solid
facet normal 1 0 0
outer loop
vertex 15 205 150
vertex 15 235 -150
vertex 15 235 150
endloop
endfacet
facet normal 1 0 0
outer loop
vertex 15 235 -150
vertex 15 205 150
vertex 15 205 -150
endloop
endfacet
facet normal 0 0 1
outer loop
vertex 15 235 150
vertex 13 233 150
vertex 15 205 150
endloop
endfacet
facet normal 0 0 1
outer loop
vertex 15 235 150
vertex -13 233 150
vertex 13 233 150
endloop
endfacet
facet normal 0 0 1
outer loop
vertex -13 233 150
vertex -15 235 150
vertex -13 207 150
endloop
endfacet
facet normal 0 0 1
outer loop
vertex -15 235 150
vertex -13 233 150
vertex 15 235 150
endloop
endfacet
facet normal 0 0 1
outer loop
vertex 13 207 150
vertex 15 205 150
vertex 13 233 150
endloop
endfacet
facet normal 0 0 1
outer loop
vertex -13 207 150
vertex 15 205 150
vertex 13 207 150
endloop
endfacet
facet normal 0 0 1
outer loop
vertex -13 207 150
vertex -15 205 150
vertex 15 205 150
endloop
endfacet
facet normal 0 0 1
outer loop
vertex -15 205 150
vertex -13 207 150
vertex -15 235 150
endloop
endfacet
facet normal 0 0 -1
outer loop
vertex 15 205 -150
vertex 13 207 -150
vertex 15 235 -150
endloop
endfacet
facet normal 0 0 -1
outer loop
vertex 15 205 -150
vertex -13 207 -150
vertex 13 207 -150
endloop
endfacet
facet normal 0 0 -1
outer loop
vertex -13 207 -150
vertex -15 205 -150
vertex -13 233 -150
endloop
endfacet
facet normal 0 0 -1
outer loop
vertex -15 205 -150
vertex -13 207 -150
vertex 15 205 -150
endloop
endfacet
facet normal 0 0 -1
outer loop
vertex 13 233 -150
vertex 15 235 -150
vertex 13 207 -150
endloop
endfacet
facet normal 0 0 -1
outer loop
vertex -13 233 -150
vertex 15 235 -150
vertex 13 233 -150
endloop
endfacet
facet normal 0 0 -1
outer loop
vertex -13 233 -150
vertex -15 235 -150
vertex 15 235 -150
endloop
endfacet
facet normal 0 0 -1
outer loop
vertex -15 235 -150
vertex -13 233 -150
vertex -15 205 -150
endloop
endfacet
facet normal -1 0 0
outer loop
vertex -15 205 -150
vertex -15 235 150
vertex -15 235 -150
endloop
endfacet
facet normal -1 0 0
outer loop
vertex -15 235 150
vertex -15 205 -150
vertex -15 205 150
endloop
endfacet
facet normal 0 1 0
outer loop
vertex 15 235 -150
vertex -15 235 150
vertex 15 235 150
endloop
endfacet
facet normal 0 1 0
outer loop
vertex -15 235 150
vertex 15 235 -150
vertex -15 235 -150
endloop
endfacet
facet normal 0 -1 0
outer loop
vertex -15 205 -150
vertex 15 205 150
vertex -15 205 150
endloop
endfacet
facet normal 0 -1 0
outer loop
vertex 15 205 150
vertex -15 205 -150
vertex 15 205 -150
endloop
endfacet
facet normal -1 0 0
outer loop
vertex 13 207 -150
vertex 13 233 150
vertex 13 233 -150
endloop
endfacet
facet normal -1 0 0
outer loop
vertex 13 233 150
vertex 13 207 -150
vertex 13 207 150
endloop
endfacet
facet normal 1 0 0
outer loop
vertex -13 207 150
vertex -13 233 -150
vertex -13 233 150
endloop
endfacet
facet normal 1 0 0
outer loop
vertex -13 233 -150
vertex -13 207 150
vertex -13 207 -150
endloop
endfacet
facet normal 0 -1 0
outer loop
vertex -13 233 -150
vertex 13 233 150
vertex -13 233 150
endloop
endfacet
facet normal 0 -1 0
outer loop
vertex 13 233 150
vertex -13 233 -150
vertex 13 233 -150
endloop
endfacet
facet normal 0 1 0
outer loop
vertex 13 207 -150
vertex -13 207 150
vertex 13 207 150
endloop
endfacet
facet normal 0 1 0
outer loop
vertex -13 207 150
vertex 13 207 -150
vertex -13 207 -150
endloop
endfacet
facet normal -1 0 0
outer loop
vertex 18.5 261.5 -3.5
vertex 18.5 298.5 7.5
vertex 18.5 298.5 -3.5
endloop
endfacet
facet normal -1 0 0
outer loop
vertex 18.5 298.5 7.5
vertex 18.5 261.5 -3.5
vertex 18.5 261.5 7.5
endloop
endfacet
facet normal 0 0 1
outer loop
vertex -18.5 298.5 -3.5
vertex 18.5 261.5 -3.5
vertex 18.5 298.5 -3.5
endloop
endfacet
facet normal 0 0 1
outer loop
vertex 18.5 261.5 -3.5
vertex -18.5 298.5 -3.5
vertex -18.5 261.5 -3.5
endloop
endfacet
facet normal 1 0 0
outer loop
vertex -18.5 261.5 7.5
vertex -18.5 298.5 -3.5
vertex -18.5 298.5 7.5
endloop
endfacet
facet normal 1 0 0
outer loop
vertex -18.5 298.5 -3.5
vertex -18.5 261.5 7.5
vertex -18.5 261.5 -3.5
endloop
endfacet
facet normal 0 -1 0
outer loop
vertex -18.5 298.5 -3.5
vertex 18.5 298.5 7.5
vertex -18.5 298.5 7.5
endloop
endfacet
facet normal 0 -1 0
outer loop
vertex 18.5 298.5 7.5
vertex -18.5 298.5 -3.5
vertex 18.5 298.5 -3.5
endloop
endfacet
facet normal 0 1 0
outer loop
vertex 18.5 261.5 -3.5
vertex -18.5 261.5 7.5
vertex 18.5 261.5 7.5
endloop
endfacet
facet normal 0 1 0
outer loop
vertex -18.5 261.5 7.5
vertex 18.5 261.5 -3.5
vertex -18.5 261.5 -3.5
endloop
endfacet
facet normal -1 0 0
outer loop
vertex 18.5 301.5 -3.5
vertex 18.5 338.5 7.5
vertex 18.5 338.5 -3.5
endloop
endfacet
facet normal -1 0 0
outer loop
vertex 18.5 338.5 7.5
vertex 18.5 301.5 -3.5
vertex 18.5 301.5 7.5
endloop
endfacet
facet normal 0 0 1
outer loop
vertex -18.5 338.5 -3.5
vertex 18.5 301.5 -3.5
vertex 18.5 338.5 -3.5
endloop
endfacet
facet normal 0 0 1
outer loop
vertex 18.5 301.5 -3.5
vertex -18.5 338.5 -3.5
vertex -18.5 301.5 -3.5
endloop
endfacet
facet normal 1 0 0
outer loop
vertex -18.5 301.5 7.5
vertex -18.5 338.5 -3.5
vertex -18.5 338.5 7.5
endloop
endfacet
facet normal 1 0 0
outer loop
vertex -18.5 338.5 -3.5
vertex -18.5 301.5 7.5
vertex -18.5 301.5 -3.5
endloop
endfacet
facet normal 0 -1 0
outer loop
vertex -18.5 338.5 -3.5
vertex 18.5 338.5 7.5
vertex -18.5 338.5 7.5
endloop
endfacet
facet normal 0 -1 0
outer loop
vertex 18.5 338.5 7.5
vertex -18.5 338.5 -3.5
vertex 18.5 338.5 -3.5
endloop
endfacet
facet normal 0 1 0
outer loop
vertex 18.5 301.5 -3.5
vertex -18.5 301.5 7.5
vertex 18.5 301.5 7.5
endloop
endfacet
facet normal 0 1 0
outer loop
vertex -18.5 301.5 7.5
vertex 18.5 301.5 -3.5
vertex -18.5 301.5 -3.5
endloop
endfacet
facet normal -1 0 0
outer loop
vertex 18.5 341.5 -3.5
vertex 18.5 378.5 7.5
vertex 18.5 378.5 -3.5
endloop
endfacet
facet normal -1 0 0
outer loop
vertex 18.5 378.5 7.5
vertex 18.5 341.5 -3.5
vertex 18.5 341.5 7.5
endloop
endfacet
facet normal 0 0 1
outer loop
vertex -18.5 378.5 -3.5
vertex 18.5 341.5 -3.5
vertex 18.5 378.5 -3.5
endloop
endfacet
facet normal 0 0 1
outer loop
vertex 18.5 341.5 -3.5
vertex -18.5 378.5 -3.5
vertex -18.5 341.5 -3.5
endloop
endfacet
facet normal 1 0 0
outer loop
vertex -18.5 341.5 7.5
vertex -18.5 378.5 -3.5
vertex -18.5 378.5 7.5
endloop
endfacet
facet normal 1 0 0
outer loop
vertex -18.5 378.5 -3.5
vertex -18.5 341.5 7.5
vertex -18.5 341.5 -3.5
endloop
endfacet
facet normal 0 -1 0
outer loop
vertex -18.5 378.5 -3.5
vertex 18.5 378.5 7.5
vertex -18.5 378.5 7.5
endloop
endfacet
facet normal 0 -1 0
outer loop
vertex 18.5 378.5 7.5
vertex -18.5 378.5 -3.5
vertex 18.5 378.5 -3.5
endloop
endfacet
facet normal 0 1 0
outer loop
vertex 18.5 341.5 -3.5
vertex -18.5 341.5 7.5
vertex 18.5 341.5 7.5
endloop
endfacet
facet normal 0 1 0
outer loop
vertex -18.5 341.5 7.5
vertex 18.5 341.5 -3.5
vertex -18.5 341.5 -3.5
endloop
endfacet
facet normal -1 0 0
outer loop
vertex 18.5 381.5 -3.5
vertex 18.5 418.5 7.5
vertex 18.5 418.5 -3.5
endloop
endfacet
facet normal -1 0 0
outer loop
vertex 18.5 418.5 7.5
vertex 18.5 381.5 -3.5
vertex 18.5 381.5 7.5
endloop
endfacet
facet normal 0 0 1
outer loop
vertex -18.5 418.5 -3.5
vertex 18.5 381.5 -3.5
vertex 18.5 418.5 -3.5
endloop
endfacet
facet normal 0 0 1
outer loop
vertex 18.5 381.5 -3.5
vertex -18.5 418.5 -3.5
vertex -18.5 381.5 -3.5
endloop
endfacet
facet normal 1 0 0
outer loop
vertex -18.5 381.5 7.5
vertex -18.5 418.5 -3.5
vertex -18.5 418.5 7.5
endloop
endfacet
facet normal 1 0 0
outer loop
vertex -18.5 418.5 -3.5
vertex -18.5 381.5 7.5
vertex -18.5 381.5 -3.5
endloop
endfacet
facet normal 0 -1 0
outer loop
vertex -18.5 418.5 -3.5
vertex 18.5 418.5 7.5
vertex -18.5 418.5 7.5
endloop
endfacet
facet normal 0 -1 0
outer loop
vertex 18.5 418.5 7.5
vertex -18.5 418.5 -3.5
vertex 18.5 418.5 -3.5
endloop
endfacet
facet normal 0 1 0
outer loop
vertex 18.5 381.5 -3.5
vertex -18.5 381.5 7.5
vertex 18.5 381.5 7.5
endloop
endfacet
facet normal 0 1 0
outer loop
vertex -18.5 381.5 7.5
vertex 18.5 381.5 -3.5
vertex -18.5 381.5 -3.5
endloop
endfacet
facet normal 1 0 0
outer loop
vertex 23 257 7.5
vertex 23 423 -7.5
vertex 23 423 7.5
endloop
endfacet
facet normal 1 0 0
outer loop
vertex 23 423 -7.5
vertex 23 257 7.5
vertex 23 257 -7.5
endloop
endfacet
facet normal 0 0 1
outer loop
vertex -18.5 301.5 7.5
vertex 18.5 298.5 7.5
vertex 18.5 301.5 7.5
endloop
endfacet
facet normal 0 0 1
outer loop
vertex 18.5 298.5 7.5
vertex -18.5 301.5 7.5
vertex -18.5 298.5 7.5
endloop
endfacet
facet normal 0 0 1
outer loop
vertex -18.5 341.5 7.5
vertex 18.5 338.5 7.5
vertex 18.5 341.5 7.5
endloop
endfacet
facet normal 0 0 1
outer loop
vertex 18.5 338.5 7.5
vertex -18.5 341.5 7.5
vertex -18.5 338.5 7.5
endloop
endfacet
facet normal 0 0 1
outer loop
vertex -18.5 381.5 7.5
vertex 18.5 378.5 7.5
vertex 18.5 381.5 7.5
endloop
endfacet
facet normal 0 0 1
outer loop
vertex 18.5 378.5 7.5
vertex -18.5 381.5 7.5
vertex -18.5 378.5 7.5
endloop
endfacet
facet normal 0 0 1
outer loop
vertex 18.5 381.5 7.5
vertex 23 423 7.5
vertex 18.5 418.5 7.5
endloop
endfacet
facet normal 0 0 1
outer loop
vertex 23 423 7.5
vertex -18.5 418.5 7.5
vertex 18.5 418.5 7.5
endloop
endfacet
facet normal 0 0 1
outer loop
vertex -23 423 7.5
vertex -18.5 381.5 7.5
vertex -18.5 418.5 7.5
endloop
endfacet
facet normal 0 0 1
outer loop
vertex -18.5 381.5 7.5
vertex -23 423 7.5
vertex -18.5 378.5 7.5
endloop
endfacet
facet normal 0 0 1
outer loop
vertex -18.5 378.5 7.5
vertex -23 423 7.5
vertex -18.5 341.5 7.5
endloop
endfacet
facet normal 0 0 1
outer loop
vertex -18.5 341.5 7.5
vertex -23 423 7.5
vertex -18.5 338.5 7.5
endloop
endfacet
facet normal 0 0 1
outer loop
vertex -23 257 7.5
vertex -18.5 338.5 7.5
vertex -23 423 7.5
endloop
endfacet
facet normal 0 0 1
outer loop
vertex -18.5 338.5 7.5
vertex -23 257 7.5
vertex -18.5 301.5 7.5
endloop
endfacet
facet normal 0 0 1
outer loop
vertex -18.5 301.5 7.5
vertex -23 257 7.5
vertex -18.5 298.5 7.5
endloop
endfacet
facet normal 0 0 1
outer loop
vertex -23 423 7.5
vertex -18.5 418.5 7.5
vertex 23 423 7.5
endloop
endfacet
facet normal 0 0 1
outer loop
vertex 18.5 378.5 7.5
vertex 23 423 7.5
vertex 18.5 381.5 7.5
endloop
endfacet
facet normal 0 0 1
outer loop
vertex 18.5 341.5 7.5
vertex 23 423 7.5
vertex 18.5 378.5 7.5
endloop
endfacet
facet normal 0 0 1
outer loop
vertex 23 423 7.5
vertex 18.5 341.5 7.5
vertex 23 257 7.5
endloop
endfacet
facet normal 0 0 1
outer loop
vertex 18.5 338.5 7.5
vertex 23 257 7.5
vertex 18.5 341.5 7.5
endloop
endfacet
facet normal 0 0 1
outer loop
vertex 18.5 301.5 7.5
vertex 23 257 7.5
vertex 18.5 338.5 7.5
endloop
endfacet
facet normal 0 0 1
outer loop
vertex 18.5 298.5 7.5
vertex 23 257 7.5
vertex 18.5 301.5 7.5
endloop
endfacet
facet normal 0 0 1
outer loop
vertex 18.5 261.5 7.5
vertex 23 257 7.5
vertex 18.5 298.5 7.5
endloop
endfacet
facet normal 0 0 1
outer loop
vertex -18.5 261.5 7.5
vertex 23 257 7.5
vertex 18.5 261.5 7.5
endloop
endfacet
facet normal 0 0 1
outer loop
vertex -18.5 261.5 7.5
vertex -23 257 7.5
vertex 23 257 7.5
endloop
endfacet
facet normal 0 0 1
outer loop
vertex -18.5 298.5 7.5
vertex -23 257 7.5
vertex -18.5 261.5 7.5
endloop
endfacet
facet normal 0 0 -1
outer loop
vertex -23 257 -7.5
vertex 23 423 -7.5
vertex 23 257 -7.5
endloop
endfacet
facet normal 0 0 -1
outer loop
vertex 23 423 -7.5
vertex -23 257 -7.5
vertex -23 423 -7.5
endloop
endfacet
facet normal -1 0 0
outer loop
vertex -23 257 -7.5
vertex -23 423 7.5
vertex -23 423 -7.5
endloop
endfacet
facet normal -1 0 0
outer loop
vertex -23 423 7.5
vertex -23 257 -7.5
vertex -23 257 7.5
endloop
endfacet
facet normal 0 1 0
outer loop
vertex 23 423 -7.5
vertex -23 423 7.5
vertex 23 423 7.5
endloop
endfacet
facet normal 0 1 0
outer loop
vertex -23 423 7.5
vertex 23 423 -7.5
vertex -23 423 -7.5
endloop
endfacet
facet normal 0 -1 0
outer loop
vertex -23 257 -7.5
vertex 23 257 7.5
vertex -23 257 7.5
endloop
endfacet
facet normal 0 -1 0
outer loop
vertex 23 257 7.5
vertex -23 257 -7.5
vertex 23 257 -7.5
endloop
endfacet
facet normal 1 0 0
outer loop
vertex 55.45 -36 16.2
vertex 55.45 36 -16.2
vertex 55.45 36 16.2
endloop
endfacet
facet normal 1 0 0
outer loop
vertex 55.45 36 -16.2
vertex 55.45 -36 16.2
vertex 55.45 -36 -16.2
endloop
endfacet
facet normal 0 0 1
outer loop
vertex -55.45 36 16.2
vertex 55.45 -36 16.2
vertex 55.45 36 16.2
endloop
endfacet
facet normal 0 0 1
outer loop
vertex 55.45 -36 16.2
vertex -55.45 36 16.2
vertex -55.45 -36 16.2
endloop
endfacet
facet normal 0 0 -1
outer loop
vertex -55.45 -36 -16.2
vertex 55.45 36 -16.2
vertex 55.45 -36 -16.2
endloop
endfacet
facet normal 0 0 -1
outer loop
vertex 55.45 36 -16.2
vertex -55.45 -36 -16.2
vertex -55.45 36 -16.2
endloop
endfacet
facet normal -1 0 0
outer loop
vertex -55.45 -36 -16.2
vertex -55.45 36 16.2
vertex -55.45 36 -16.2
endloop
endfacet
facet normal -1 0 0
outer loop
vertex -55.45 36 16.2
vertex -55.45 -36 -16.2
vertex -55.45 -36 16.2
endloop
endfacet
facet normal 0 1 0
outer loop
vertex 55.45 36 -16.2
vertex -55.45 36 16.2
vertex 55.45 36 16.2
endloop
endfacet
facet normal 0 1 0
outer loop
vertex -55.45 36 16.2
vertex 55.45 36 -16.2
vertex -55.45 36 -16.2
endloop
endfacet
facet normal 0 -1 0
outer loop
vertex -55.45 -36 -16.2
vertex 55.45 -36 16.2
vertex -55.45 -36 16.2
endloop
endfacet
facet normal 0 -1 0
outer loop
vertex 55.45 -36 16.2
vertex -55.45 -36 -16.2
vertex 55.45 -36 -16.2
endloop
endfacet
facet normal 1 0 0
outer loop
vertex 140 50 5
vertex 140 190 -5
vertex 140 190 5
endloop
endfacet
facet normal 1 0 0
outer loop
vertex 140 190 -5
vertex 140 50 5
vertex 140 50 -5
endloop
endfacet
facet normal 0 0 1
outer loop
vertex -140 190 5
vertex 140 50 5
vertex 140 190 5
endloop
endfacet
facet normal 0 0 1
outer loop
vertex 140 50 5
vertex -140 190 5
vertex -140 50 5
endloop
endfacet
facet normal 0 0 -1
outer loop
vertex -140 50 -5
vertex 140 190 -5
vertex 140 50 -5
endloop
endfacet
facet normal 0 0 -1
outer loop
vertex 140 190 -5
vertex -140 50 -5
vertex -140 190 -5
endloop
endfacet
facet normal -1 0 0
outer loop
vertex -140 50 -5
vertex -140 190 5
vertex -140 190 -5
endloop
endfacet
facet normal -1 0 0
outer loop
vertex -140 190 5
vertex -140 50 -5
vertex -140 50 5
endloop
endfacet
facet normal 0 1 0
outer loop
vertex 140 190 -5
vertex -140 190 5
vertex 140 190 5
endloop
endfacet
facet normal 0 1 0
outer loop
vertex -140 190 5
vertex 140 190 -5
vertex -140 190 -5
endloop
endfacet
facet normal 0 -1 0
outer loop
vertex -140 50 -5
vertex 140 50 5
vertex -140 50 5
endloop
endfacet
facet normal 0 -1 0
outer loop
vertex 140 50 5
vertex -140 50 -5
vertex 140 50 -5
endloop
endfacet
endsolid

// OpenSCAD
// Printable parts of the chess rig, parametric.
// Generated by hardware/generate.py from chess_sim - edit there, not here.
// All dimensions in millimetres.

board_square      = 28.0;
board_overall     = 244.0;
arm_riser_height  = 32.4;
arm_base_x        = 110.9;
arm_base_y        = 72.0;
mast_plate        = [280.0, 140.0, 10.0];
mast_tube         = 30.0;
mast_height       = 600.0;
tray_slots        = 4;
tray_pitch        = 40.0;
tray_wall         = 3.0;
tray_depth        = 12.0;

module arm_riser() { cube([arm_base_x, arm_base_y, arm_riser_height], center = true); }

module mast_plate() { cube(mast_plate, center = true); }

// print in two halves if the bed is shorter than the mast
module mast_tube(length = mast_height / 2, wall = 2) {
    difference() {
        cube([mast_tube, mast_tube, length], center = true);
        cube([mast_tube - 2 * wall, mast_tube - 2 * wall, length + 1], center = true);
    }
}

module capture_tray() {
    pocket = tray_pitch - tray_wall;
    difference() {
        cube([tray_pitch + 2 * tray_wall,
              tray_slots * tray_pitch + 2 * tray_wall,
              tray_depth + tray_wall], center = true);
        for (i = [0 : tray_slots - 1])
            translate([0,
                       (i - (tray_slots - 1) / 2) * tray_pitch,
                       tray_wall])
                cube([pocket, pocket, tray_depth + 1], center = true);
    }
}

arm_riser();
translate([0, 120, 0]) mast_plate();
translate([0, 220, 0]) mast_tube();
translate([0, 340, 0]) capture_tray();
